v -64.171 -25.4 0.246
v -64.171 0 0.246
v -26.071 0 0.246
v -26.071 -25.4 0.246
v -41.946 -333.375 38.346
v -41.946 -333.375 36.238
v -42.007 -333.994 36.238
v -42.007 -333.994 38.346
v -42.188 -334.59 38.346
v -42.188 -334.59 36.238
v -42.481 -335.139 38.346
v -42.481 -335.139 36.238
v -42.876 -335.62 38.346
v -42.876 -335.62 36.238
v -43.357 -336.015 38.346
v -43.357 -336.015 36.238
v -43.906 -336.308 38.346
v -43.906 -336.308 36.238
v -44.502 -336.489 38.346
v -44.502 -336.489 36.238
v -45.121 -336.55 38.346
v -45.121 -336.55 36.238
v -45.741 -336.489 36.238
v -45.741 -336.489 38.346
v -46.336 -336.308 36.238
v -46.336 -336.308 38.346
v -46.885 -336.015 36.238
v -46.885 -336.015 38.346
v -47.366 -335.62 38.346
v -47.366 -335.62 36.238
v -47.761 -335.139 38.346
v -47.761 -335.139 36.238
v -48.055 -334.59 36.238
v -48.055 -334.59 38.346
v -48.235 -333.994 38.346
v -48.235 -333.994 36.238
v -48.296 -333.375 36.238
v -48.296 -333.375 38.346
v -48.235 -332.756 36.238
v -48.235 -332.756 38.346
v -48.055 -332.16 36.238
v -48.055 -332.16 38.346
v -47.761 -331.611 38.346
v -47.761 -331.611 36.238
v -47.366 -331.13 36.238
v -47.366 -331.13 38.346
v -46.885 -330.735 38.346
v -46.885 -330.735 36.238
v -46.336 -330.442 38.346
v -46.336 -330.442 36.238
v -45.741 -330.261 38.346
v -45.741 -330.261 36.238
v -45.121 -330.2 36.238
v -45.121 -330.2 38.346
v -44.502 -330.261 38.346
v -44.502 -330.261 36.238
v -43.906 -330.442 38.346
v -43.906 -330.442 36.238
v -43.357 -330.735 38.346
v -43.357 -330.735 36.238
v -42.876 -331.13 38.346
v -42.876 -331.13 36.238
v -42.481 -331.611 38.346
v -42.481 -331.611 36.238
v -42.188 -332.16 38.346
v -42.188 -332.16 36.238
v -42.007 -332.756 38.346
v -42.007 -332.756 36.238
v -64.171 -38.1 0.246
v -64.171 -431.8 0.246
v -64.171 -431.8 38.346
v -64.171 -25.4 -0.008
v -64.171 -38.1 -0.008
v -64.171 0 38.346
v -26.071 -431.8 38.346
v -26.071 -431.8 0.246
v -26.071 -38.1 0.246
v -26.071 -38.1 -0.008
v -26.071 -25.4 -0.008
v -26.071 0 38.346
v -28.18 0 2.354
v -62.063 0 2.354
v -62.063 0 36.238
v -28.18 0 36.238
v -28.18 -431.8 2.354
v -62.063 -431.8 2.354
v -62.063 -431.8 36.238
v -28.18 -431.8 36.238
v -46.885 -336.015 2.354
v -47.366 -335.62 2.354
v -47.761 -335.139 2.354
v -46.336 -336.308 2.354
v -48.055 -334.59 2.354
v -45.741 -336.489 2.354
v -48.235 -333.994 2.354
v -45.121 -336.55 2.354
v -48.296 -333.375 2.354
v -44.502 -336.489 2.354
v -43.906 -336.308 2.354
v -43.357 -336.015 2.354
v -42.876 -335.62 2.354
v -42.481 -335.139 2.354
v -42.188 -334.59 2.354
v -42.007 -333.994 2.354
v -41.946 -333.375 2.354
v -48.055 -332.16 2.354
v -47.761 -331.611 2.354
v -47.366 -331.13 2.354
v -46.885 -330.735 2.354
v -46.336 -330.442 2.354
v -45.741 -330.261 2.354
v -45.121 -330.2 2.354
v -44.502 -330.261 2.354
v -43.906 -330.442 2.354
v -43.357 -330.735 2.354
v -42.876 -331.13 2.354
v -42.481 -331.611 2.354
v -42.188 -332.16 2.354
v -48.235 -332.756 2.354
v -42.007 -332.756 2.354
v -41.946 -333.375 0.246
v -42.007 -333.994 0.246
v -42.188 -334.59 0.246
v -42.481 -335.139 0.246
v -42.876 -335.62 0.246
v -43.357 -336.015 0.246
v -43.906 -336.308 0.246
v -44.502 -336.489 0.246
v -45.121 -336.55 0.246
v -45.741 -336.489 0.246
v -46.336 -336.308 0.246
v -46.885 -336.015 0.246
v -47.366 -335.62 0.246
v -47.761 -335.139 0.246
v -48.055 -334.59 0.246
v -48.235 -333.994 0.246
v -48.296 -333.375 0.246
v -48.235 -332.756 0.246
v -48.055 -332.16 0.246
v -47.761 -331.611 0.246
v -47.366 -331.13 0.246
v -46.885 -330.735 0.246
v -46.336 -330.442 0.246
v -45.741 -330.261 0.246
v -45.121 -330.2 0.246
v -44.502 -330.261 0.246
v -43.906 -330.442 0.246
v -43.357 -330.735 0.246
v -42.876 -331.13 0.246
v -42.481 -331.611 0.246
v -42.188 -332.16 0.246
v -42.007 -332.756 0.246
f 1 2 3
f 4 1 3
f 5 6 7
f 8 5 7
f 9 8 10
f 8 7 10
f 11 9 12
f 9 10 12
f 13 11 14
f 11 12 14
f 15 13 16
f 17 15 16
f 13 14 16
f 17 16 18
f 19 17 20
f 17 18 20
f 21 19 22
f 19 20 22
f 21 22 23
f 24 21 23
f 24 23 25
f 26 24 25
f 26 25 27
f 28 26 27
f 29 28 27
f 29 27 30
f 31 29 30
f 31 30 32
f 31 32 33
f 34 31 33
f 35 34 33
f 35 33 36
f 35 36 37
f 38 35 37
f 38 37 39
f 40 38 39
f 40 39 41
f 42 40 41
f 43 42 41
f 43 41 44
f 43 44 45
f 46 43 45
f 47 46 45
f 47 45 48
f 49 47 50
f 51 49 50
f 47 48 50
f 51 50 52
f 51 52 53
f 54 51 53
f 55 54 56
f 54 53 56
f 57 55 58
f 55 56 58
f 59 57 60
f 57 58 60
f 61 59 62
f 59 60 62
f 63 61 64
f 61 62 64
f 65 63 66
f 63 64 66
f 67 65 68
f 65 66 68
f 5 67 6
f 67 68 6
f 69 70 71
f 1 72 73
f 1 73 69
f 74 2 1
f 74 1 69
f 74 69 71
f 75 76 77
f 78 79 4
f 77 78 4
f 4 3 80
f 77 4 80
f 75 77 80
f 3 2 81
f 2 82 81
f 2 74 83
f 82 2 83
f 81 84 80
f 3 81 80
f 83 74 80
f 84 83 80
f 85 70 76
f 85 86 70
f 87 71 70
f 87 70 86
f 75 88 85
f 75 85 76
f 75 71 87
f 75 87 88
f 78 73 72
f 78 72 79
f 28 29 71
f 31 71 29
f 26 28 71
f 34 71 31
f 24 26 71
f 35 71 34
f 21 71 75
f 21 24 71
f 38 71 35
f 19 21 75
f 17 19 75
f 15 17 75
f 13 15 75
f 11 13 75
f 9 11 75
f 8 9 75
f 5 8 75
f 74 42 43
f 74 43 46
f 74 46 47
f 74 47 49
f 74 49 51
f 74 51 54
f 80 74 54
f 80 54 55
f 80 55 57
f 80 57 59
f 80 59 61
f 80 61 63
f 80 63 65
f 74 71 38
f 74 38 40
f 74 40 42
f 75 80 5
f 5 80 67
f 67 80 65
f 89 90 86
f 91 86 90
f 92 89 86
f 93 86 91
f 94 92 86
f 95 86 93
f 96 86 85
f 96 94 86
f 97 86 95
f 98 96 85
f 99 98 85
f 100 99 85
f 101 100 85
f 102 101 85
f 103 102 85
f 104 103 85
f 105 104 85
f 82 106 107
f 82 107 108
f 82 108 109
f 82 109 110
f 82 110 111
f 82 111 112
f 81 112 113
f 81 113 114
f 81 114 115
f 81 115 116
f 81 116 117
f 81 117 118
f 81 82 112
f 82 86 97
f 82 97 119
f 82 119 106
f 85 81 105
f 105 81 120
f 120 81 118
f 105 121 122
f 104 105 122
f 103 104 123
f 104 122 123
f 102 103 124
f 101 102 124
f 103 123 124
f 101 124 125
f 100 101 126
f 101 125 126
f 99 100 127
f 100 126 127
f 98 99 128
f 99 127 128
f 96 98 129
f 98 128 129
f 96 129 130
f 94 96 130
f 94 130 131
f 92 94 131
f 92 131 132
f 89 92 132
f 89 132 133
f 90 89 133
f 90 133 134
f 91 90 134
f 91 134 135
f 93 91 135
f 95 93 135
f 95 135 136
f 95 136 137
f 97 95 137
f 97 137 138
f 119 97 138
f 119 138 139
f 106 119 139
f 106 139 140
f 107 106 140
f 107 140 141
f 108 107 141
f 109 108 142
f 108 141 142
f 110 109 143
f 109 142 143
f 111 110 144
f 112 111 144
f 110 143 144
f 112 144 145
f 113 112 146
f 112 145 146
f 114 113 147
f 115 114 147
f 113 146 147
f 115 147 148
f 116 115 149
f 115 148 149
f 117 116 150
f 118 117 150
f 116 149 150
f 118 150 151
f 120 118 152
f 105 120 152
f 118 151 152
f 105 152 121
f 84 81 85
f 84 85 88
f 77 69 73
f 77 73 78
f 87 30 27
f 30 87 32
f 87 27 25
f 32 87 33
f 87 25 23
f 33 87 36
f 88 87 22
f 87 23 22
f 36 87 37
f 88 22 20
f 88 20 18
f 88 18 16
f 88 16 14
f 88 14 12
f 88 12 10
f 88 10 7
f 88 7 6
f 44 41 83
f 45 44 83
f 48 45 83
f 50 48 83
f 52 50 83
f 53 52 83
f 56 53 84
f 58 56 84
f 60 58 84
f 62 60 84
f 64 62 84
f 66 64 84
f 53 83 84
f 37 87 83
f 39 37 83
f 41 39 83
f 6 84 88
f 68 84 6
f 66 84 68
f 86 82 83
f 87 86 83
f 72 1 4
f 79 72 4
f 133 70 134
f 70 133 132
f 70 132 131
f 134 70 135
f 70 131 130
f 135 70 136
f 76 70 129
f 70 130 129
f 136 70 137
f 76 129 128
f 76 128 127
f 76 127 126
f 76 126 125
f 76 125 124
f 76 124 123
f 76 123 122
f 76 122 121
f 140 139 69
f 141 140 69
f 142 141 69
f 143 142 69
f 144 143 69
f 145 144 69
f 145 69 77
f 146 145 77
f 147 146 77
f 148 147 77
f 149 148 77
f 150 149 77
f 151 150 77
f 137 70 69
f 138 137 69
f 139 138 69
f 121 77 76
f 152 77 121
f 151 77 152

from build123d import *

# Parameters (mm, degrees)
F0_W     = 38.1
F0_H     = 38.1
F0_W_2   = 33.8836
F0_H_2   = 33.8836
F1_DEPTH = 431.8
F2_W     = 38.1
F2_H     = 12.7
F3_DEPTH = 0.254
F4_R     = 3.175
F5_DEPTH = 76.2


with BuildPart() as f1:
    # F0 (on Front) → F1 (new body)
    with BuildSketch(Plane.XZ):
        with Locations((-45.121367, 19.295737)):
            Rectangle(F0_W, F0_H)
        with Locations((-45.121367, 19.295737)):
            Rectangle(F0_W_2, F0_H_2, mode=Mode.SUBTRACT)
    extrude(amount=F1_DEPTH)

    # F2 (on face) → F3 (join)
    with BuildSketch(Plane(origin=(0, 0, 0.245737), x_dir=(1, 0, 0), z_dir=(0, 0, -1))):
        with Locations((-45.121367, 31.75)):
            Rectangle(F2_W, F2_H)
    extrude(amount=F3_DEPTH)

    # F4 (on face) → F5 (cut)
    with BuildSketch(Plane(origin=(0, 0, 0.245737), x_dir=(1, 0, 0), z_dir=(0, 0, -1))):
        with Locations((-45.121367, 333.375)):
            Circle(F4_R)
    extrude(amount=-F5_DEPTH, mode=Mode.SUBTRACT)


solid = f1.part
